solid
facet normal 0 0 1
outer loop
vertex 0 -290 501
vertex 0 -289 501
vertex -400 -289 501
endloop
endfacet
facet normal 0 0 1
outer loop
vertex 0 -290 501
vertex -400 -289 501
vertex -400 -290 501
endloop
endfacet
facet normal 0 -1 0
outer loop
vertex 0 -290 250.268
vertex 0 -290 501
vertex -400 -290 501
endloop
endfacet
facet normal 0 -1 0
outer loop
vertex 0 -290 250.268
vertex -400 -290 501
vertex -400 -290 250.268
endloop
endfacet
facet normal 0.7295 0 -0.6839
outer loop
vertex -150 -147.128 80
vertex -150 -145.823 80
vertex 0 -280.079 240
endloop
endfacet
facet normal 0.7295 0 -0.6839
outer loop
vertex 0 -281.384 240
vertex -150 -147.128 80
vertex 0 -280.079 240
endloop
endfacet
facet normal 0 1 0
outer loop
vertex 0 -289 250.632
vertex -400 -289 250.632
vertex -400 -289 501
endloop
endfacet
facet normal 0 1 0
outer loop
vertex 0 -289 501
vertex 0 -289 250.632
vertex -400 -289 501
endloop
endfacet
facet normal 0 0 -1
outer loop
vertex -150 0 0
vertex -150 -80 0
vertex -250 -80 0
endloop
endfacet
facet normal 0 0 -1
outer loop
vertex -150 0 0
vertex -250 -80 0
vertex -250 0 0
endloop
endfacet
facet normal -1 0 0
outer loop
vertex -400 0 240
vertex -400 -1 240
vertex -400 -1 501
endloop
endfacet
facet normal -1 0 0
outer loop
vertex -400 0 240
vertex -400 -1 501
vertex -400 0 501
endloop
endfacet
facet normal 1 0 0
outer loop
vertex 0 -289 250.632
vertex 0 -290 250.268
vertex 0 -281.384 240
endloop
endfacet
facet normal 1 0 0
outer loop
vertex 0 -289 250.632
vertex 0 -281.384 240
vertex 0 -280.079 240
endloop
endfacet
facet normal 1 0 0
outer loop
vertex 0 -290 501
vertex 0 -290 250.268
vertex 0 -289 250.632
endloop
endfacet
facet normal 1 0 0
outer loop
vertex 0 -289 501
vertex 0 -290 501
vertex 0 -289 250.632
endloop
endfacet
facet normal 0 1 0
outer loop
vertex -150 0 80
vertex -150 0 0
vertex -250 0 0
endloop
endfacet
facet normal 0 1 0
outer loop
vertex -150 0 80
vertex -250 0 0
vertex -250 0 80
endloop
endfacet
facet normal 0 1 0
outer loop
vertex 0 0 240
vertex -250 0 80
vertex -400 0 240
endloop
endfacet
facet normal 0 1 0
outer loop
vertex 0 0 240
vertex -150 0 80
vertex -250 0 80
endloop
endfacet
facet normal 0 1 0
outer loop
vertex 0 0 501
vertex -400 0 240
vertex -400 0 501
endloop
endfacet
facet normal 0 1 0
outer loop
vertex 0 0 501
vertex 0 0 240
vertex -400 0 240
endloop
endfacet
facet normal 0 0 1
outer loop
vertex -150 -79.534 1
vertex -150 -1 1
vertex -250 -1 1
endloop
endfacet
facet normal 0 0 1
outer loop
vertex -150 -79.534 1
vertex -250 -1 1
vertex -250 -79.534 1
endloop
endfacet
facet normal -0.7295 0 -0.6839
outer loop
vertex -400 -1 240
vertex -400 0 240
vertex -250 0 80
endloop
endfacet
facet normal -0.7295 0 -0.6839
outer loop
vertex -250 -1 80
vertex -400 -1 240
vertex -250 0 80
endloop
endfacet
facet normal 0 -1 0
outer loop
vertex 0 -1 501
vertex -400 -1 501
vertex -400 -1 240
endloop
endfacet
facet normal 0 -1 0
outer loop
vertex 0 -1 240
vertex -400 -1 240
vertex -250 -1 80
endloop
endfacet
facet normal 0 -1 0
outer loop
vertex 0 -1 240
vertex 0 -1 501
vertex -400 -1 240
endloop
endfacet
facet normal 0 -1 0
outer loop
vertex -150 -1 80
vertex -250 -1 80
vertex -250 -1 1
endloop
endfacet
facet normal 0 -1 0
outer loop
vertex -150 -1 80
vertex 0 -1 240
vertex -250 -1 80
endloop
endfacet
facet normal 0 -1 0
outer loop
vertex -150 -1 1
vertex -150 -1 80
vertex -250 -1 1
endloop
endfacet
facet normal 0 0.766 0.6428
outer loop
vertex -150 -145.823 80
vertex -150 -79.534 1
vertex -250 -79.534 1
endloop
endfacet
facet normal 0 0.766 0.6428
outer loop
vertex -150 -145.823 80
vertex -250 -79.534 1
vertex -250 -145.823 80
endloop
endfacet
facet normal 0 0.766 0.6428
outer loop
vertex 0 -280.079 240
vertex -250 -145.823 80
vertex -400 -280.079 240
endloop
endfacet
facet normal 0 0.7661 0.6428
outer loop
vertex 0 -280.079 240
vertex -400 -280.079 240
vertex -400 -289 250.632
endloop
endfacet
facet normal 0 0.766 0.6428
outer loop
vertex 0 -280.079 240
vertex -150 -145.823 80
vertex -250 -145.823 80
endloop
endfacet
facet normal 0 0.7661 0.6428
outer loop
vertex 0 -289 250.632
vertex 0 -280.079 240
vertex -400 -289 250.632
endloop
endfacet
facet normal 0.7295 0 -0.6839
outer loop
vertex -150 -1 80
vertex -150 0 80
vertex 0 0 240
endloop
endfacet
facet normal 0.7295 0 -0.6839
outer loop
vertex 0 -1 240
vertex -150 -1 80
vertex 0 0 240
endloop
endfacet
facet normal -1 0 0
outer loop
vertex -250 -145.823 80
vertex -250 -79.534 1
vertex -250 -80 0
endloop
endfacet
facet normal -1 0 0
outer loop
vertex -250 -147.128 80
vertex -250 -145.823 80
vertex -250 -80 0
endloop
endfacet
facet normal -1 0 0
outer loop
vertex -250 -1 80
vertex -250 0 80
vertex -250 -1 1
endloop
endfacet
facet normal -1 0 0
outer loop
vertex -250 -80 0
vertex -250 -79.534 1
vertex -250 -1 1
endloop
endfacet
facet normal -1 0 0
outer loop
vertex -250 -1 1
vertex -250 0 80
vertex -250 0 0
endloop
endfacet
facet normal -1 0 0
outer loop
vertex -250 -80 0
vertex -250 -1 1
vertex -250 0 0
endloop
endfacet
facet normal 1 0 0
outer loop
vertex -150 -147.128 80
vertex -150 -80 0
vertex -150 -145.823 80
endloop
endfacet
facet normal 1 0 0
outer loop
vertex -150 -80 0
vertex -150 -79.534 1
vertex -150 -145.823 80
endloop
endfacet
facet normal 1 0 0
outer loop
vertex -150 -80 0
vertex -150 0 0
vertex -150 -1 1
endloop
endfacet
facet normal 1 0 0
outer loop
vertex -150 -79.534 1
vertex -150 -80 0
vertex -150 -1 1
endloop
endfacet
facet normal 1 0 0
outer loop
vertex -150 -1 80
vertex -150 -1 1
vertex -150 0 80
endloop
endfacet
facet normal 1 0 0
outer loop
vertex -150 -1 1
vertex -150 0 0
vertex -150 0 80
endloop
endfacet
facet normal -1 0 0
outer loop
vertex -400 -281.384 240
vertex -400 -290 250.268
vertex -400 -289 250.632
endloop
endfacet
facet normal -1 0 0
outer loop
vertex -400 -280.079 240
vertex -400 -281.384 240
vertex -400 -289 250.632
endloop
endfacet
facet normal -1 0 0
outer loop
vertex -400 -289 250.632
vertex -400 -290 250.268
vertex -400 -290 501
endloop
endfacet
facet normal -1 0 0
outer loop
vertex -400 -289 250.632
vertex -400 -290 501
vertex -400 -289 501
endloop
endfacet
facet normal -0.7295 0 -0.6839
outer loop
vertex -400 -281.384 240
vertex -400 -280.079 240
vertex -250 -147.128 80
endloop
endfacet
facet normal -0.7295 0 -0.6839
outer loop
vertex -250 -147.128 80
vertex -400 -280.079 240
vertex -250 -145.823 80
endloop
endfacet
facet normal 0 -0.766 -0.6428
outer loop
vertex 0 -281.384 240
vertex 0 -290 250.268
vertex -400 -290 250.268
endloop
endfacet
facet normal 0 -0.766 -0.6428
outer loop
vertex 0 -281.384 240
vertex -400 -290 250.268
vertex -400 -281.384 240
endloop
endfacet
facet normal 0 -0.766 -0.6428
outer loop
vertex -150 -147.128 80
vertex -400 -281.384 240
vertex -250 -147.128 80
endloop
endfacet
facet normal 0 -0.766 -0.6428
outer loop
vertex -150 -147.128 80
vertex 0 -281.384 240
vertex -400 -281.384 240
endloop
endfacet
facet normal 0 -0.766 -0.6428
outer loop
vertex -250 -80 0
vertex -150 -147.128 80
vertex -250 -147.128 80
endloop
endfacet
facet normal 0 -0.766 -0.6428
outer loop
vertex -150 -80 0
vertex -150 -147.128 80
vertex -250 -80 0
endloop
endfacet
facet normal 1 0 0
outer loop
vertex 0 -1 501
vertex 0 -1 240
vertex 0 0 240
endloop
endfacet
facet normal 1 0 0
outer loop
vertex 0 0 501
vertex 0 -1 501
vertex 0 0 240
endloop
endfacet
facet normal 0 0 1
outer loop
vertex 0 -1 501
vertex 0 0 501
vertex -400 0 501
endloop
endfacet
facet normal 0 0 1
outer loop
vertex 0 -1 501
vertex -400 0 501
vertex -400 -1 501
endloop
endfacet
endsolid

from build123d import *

# Parameters (mm, degrees)
F1_DEPTH = 400
F3_DEPTH = 290.001


# Not quite as in the source:
# - a feature names something its author has since deleted; it is built from what else it names


with BuildPart() as f1:
    # F0 (on Right) → F1 (new body)
    with BuildSketch(Plane.YZ):
        Polygon((-80, 0), (0, 0), (0, 501), (-1, 501), (-1, 1), (-79.5336923418, 1), (-289, 250.6322246791), (-289, 501), (-290, 501), (-290, 250.2682544448), align=None)
    extrude(amount=-F1_DEPTH)

    # F2 (on face) → F3 (cut, through all)
    with BuildSketch(Plane(origin=(0, 0, 0), x_dir=(-1, 0, 0), z_dir=(0, 1, 0))):
        Polygon((400, 0), (400, 240), (250, 80), (250, 0), align=None)
        Polygon((0, 0), (150, 0), (150, 80), (0, 240), align=None)
    extrude(amount=-F3_DEPTH, mode=Mode.SUBTRACT)


solid = f1.part
